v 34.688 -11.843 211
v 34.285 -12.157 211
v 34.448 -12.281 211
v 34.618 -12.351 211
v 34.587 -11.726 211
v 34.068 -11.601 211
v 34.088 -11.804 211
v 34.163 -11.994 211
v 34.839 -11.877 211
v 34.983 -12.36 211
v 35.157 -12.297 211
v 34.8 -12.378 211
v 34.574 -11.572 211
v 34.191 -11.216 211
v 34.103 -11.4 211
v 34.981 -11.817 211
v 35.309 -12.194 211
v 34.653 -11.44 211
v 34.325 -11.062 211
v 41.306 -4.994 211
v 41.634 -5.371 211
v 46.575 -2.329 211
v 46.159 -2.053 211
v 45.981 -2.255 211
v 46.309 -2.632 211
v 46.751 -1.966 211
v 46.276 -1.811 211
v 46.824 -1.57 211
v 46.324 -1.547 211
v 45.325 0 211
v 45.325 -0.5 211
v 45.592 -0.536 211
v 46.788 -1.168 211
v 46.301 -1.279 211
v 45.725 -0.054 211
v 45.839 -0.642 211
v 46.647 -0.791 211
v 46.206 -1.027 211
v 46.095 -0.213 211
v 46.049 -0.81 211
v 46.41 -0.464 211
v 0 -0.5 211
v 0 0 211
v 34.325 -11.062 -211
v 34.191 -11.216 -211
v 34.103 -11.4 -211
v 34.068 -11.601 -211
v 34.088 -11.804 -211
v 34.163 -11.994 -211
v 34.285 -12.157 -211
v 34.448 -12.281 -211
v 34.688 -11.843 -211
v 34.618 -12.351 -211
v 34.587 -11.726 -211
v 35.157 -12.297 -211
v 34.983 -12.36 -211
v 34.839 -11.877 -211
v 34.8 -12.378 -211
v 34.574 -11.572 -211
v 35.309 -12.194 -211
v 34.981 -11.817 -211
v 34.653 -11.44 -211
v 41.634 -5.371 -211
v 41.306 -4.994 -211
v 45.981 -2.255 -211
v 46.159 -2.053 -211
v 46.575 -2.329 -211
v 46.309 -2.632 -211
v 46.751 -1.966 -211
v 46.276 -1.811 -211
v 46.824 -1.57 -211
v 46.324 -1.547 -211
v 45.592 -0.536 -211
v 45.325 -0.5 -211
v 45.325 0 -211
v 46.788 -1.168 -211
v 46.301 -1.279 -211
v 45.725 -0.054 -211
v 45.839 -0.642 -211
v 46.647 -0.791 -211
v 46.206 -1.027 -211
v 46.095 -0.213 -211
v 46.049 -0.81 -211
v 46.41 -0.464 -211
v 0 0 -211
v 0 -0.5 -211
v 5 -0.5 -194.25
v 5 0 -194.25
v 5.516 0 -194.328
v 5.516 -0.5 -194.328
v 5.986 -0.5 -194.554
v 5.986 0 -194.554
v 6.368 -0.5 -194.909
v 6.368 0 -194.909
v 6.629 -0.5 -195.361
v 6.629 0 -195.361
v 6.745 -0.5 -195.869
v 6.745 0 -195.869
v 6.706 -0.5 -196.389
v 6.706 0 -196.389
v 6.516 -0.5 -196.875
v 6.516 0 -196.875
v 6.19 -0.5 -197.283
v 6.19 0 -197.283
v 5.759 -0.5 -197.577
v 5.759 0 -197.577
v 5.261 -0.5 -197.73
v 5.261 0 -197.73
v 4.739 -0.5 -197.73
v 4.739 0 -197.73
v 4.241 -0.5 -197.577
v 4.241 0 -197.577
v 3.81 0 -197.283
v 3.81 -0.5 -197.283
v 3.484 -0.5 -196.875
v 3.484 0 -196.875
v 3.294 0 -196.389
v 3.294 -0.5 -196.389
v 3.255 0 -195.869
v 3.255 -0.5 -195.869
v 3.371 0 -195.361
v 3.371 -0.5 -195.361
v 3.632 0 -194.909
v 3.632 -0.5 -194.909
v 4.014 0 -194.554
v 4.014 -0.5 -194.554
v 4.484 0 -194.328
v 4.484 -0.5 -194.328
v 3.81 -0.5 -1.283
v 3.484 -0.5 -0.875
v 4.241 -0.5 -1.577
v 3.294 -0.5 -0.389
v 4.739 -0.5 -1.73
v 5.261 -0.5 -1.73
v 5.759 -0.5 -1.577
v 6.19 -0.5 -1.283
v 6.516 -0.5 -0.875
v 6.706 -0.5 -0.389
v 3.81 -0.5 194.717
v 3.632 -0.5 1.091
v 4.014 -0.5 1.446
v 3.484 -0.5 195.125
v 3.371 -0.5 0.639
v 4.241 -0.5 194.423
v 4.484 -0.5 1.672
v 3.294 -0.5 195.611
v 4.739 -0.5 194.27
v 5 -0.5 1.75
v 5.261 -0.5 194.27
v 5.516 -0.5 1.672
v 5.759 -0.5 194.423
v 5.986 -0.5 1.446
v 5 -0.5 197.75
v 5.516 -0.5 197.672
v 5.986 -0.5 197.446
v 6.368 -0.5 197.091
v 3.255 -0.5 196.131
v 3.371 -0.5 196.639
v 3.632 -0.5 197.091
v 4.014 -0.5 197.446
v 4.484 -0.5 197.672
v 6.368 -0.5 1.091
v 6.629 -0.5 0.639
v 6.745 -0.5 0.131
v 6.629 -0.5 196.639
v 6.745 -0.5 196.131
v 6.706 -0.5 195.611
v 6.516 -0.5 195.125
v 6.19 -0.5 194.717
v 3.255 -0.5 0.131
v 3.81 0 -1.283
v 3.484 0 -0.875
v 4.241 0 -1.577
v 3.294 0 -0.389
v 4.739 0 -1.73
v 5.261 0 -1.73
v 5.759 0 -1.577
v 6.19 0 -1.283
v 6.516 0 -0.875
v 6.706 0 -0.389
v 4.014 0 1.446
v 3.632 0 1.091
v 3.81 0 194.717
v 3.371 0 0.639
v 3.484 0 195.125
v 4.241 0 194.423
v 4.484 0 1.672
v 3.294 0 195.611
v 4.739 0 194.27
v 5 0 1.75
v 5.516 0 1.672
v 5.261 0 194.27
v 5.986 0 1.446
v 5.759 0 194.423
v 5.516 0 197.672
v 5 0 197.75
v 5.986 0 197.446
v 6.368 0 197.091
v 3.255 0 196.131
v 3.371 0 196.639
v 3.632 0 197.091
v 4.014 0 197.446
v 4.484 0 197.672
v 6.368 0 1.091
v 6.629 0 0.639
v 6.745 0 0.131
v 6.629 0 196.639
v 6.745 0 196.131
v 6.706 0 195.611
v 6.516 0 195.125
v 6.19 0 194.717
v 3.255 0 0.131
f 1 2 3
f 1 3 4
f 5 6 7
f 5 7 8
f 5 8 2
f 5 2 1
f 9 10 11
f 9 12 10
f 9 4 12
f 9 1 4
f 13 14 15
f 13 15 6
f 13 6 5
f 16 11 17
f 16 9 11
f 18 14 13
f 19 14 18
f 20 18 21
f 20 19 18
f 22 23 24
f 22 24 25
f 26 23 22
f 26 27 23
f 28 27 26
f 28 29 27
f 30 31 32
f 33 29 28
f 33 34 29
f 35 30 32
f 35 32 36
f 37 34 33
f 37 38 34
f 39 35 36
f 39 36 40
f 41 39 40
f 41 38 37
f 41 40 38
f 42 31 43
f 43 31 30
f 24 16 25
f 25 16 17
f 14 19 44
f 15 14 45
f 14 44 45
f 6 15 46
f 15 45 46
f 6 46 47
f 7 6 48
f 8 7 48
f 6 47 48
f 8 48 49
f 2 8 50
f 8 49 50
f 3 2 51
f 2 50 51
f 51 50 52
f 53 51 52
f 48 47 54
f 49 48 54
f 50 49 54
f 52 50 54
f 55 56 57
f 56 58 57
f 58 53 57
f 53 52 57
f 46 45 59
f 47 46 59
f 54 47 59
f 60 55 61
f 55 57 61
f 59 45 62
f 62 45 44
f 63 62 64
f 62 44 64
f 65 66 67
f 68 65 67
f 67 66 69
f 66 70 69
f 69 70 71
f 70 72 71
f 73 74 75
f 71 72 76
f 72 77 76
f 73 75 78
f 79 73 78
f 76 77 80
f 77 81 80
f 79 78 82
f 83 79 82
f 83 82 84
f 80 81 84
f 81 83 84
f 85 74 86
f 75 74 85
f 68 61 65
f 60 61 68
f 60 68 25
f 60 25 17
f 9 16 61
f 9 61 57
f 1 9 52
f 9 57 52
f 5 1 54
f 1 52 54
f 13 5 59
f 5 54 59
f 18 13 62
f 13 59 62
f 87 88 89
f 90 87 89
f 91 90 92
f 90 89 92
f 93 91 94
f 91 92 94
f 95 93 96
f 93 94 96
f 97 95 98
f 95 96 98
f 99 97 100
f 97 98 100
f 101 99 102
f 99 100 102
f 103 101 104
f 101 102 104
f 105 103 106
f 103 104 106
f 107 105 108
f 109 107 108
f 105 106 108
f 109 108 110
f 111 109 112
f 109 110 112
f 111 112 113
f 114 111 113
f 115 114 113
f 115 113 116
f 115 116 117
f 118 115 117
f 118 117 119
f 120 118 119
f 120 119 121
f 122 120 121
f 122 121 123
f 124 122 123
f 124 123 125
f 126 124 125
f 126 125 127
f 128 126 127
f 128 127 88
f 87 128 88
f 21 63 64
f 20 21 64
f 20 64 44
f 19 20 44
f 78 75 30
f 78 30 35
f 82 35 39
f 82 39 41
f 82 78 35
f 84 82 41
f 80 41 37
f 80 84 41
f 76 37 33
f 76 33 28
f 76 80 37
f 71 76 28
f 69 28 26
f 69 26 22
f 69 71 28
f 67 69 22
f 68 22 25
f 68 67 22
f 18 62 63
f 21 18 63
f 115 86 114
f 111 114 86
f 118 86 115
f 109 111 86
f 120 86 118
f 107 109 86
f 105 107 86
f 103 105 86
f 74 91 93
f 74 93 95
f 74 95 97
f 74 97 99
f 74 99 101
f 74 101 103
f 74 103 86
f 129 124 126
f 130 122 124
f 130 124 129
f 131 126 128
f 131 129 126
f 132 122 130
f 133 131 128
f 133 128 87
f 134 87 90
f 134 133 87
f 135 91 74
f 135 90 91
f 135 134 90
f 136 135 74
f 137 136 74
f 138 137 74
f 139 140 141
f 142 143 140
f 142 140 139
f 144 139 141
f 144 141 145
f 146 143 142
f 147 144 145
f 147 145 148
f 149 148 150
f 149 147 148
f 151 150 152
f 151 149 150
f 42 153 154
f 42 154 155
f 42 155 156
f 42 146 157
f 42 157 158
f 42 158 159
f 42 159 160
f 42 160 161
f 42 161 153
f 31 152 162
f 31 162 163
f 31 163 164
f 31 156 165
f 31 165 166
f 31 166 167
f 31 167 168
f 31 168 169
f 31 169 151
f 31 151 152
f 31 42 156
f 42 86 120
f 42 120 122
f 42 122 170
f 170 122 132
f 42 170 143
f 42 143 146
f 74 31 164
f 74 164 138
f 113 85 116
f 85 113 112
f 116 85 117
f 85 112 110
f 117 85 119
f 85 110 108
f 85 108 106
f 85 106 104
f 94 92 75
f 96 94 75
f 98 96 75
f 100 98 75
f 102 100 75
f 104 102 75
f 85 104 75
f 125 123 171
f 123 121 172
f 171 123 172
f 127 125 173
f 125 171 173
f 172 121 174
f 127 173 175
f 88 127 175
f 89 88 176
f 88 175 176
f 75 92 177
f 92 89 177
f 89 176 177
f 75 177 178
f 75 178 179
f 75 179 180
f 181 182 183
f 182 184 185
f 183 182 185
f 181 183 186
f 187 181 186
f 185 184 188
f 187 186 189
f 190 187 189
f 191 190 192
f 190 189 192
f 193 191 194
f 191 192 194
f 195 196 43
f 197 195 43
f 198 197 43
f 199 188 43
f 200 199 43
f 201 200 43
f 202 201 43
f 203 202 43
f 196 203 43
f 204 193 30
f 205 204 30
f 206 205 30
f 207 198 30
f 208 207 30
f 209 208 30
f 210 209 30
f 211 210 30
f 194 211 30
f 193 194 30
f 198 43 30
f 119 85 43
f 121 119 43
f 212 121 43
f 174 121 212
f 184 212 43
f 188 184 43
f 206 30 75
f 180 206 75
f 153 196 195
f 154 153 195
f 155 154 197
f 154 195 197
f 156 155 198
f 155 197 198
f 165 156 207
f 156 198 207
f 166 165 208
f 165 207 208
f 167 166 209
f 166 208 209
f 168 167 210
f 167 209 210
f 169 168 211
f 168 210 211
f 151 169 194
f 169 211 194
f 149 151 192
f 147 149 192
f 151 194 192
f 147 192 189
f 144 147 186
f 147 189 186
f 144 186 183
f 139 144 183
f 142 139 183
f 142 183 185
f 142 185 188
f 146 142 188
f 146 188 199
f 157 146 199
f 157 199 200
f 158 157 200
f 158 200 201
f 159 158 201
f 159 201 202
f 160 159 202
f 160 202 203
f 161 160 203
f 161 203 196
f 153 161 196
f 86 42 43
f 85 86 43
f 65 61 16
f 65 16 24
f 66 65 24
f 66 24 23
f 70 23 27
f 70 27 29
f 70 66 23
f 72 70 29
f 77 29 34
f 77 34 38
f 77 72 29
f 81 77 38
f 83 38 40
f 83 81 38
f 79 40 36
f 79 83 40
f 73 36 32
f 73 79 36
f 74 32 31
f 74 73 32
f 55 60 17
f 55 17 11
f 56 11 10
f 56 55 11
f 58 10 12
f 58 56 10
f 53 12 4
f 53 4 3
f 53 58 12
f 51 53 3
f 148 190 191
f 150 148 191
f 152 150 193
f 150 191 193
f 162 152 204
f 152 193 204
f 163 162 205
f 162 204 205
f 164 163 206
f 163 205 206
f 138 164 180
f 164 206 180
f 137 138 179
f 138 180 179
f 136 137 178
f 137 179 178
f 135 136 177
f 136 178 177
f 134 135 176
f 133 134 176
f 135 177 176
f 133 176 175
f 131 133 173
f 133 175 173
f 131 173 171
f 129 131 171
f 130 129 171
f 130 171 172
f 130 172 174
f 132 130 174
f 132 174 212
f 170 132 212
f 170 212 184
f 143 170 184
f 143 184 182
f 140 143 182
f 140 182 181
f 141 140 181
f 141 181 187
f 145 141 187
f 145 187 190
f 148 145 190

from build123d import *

# Parameters (mm, degrees)
SKETCH1_W                    = 48
SKETCH1_H                    = 0.5
BASE_FLANGE1_DEPTH           = 211
SKETCH6_R                    = 1.75
CUT_EXTRUDE1_DEPTH           = 10
EDGE_FLANGE1_STRIP_CUT_DEPTH = 422
EDGE_FLANGE1_DEPTH           = 422
HEM1_START                   = -211
HEM1_DEPTH                   = 422
HEM1_2_DEPTH                 = 422


# Read off the part's stored shape, not the designer's step: Hem1
# Sheet-metal steps are written as plain solids
with BuildPart() as part:
    # Sketch1 → Base-Flange1 (new, symmetric)
    with BuildSketch(Plane.XY):
        with Locations((24, -0.25)):
            Rectangle(SKETCH1_W, SKETCH1_H)
    extrude(amount=BASE_FLANGE1_DEPTH, both=True)

    # Sketch6 → Cut-Extrude1 (cut)
    with BuildSketch(Plane(origin=(0, 0, 0), x_dir=(1, 0, 0), z_dir=(0, 1, 0))):
        with Locations(Location((5, 196, 0), (0, 0, 270))):
            Circle(SKETCH6_R)
        with Locations(Location((5, 0, 0), (0, 0, 270))):
            Circle(SKETCH6_R)
        with Locations(Location((5, -196, 0), (0, 0, 270))):
            Circle(SKETCH6_R)
    extrude(amount=-CUT_EXTRUDE1_DEPTH, mode=Mode.SUBTRACT)

    # Edge-Flange1 strip (across the edge) → Edge-Flange1 strip cut (cut)
    with BuildSketch(Plane(origin=(48, -0.5, -211), x_dir=(-0.6560590289905086, 0.754709580222771, 0), z_dir=(0, 0, 1))):
        Polygon((-4.886773951, -6.383716909), (2.13206437, 1.69053295), (1.75470958, 2.018562465), (-5.264128741, -6.055687395), align=None)
    extrude(amount=EDGE_FLANGE1_STRIP_CUT_DEPTH, mode=Mode.SUBTRACT)

    # Edge-Flange1 section (across the edge) → Edge-Flange1 (add)
    with BuildSketch(Plane(origin=(48, -0.5, -211), x_dir=(-0.6560590289905086, 0.754709580222771, 0), z_dir=(0, 0, 1))):
        with BuildLine():
            Line((-0.5, 2.674621494), (-0.5, 18))
            Line((-0.5, 18), (0, 18))
            Line((0, 18), (0, 2.674621494))
            ThreePointArc((0, 2.674621494), (0.649792619, 1.737949305), (1.75470958, 2.018562465))
            Line((1.75470958, 2.018562465), (2.13206437, 1.69053295))
            ThreePointArc((2.13206437, 1.69053295), (0.474688928, 1.26961321), (-0.5, 2.674621494))
        make_face()
    extrude(amount=EDGE_FLANGE1_DEPTH)

    # Hem1 outline → Hem1 (cut)
    with BuildSketch(Plane.XY.offset(HEM1_START)):
        with BuildLine():
            ThreePointArc((35.309289256, -12.19437304), (34.892198615, -12.374586092), (34.447599479, -12.280922038))
            Line((34.447599479, -12.280922038), (34.415227556, -12.309062522))
            Line((34.415227556, -12.309062522), (34.74325707, -12.686417312))
            Line((34.74325707, -12.686417312), (35.309289256, -12.19437304))
        make_face()
    extrude(amount=HEM1_DEPTH, mode=Mode.SUBTRACT)

    # Hem1 2 outline → Hem1 2 (add)
    with BuildSketch(Plane.XY.offset(HEM1_START)):
        with BuildLine():
            Line((41.634293844, -5.371117442), (41.306264329, -4.993762652))
            Line((41.306264329, -4.993762652), (34.325200712, -11.06230867))
            ThreePointArc((34.325200712, -11.06230867), (34.070999747, -11.703294486), (34.447599479, -12.280922038))
            Line((34.447599479, -12.280922038), (34.981259741, -11.81701825))
            ThreePointArc((34.981259741, -11.81701825), (34.628567589, -11.792355612), (34.653230227, -11.43966346))
            Line((34.653230227, -11.43966346), (41.634293844, -5.371117442))
        make_face()
    extrude(amount=HEM1_2_DEPTH)


solid = part.part
